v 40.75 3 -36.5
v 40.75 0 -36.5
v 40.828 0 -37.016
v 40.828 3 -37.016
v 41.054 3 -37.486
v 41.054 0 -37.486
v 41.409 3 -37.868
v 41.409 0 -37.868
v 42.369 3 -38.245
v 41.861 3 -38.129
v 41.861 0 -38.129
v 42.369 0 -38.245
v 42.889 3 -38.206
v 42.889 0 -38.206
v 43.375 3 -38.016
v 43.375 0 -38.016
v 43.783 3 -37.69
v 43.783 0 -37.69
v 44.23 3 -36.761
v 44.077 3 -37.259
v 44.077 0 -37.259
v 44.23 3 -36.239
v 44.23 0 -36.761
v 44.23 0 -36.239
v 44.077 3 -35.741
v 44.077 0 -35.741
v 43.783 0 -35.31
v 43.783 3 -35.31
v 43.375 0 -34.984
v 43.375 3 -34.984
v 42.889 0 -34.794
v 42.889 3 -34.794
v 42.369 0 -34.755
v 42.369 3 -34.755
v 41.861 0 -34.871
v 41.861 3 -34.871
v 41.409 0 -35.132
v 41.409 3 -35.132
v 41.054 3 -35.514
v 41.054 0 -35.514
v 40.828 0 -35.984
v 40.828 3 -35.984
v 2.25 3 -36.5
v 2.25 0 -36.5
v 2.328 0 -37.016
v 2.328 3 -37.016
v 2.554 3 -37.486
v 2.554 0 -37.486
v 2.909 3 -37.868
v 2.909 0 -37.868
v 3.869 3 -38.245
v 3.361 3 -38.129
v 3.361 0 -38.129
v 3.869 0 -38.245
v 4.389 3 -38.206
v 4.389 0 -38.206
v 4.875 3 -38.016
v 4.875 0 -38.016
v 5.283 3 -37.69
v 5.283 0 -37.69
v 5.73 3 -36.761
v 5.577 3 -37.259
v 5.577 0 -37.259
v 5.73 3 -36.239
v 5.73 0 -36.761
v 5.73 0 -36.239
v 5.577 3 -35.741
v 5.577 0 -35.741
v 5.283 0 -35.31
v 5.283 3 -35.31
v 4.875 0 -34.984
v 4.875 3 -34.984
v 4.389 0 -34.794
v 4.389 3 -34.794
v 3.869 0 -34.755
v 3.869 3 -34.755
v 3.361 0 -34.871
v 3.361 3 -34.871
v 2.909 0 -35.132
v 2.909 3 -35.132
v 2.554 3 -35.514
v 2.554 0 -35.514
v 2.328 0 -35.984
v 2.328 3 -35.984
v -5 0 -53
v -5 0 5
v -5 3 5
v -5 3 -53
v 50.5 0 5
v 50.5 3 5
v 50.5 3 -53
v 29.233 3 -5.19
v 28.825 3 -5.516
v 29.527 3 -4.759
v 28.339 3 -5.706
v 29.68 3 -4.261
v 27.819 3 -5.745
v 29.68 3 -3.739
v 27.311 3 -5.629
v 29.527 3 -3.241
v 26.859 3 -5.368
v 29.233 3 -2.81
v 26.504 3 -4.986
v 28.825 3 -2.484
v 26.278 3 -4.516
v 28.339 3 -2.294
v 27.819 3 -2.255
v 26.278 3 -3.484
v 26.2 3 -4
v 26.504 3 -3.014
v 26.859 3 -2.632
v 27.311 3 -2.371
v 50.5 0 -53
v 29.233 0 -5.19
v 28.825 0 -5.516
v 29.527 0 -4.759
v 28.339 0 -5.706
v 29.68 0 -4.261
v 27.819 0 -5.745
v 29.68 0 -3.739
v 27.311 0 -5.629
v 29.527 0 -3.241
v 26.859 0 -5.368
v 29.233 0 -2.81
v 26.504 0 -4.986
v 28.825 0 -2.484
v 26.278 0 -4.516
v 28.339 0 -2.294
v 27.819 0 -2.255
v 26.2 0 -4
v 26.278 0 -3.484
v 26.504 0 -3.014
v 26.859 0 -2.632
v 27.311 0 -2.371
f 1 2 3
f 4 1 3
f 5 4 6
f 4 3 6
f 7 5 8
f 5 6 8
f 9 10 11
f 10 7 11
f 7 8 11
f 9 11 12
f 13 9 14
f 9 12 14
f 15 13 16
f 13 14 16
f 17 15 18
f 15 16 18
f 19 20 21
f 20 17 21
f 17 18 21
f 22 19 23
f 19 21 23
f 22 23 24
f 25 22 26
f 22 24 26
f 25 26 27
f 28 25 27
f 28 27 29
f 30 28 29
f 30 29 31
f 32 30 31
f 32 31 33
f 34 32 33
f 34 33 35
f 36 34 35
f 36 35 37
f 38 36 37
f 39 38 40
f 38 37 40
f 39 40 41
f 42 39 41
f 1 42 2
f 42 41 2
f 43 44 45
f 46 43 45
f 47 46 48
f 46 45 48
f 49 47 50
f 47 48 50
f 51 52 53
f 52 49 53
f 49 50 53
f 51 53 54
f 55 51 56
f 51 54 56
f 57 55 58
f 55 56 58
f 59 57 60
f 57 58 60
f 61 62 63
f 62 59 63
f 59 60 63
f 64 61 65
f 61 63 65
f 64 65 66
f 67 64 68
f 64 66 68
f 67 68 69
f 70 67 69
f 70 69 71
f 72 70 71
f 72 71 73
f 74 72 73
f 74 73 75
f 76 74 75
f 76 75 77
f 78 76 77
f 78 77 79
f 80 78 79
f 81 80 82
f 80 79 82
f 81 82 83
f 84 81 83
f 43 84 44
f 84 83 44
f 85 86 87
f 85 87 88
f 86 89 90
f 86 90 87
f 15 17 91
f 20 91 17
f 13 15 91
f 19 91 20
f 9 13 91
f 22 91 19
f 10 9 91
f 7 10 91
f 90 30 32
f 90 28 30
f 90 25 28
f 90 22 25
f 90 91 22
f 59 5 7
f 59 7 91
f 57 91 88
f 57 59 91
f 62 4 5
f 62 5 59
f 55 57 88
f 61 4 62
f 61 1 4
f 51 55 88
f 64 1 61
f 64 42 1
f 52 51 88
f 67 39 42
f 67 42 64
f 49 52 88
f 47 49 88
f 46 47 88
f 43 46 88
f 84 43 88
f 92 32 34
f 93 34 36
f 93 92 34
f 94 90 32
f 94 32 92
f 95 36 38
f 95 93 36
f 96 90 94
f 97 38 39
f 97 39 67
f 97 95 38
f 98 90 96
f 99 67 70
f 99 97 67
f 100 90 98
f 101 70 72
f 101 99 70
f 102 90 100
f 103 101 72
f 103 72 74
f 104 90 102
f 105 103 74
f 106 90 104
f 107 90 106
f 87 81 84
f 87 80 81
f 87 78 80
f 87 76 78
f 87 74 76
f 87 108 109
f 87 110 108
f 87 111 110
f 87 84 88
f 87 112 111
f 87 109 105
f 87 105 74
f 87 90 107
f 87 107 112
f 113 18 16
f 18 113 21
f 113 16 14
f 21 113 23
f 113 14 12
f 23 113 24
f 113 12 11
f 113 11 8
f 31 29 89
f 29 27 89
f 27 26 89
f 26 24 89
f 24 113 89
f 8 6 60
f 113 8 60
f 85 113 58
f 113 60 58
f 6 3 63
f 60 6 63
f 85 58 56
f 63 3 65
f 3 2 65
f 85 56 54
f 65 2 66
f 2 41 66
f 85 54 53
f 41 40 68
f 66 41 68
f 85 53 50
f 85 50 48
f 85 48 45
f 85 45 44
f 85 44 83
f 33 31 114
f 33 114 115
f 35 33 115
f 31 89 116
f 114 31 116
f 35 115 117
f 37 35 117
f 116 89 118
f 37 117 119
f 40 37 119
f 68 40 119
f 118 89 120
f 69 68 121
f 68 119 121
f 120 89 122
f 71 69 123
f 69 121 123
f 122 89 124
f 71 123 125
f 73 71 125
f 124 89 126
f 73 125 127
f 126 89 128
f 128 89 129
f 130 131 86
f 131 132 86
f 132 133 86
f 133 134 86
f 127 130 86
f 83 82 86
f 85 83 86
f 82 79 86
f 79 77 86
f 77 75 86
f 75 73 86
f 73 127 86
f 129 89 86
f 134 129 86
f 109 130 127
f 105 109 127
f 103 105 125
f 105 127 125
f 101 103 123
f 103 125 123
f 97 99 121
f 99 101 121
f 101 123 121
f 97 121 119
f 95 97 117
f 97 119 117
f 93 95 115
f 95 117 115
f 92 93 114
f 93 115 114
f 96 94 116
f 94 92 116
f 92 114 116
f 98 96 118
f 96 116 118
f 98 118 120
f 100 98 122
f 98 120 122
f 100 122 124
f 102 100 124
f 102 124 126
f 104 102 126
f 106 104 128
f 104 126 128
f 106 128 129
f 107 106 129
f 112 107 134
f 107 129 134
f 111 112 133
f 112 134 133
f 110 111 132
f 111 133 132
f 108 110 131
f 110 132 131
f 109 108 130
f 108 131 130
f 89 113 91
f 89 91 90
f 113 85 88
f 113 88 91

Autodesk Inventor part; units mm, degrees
ref_plane "YZ Plane" through (0, 0, 0) normal (1, 0, 0) x (0, 1, 0)
ref_plane "XZ Plane" through (0, 0, 0) normal (0, 1, 0) x (-1, 0, 0)
ref_plane "XY Plane" through (0, 0, 0) normal (0, 0, 1) x (1, 0, 0)
sketch "Skizze1" plane through (0, 0, 0) normal (0, 1, 0) x (-1, 0, 0)
  line L0 (0, 0) -> (-45.5, 0) construction
  line L1 (-45.5, 0) -> (-45.5, -48) construction
  line L2 (-45.5, -48) -> (0, -48) construction
  line L3 (0, -48) -> (0, 0) construction
  circle A0 centre (-4, -36.5) radius 1.75
  circle A1 centre (-42.5, -36.5) radius 1.75
  circle A2 centre (-27.95, -4) radius 1.75
  line L4 (5, -53) -> (-50.5, -53)
  line L5 (-50.5, -53) -> (-50.5, 5)
  line L6 (-50.5, 5) -> (5, 5)
  line L7 (5, 5) -> (5, -53)
  dimension "d0" = 45.5
  dimension "d1" = 48
  dimension "d2" = 11.5
  dimension "d3" = 11.5
  dimension "d4" = 3
  dimension "d5" = 4
  dimension "d6" = 17.55
  dimension "d7" = 4
  dimension "d8" = 3.5
  dimension "d9" = 5
  dimension "d10" = 5
  dimension "d11" = 5
  dimension "d12" = 5
extrude "Extrusion1" add sketch "Skizze1" along normal blind 3
properties part number "Sensor_Schutzplatte"
